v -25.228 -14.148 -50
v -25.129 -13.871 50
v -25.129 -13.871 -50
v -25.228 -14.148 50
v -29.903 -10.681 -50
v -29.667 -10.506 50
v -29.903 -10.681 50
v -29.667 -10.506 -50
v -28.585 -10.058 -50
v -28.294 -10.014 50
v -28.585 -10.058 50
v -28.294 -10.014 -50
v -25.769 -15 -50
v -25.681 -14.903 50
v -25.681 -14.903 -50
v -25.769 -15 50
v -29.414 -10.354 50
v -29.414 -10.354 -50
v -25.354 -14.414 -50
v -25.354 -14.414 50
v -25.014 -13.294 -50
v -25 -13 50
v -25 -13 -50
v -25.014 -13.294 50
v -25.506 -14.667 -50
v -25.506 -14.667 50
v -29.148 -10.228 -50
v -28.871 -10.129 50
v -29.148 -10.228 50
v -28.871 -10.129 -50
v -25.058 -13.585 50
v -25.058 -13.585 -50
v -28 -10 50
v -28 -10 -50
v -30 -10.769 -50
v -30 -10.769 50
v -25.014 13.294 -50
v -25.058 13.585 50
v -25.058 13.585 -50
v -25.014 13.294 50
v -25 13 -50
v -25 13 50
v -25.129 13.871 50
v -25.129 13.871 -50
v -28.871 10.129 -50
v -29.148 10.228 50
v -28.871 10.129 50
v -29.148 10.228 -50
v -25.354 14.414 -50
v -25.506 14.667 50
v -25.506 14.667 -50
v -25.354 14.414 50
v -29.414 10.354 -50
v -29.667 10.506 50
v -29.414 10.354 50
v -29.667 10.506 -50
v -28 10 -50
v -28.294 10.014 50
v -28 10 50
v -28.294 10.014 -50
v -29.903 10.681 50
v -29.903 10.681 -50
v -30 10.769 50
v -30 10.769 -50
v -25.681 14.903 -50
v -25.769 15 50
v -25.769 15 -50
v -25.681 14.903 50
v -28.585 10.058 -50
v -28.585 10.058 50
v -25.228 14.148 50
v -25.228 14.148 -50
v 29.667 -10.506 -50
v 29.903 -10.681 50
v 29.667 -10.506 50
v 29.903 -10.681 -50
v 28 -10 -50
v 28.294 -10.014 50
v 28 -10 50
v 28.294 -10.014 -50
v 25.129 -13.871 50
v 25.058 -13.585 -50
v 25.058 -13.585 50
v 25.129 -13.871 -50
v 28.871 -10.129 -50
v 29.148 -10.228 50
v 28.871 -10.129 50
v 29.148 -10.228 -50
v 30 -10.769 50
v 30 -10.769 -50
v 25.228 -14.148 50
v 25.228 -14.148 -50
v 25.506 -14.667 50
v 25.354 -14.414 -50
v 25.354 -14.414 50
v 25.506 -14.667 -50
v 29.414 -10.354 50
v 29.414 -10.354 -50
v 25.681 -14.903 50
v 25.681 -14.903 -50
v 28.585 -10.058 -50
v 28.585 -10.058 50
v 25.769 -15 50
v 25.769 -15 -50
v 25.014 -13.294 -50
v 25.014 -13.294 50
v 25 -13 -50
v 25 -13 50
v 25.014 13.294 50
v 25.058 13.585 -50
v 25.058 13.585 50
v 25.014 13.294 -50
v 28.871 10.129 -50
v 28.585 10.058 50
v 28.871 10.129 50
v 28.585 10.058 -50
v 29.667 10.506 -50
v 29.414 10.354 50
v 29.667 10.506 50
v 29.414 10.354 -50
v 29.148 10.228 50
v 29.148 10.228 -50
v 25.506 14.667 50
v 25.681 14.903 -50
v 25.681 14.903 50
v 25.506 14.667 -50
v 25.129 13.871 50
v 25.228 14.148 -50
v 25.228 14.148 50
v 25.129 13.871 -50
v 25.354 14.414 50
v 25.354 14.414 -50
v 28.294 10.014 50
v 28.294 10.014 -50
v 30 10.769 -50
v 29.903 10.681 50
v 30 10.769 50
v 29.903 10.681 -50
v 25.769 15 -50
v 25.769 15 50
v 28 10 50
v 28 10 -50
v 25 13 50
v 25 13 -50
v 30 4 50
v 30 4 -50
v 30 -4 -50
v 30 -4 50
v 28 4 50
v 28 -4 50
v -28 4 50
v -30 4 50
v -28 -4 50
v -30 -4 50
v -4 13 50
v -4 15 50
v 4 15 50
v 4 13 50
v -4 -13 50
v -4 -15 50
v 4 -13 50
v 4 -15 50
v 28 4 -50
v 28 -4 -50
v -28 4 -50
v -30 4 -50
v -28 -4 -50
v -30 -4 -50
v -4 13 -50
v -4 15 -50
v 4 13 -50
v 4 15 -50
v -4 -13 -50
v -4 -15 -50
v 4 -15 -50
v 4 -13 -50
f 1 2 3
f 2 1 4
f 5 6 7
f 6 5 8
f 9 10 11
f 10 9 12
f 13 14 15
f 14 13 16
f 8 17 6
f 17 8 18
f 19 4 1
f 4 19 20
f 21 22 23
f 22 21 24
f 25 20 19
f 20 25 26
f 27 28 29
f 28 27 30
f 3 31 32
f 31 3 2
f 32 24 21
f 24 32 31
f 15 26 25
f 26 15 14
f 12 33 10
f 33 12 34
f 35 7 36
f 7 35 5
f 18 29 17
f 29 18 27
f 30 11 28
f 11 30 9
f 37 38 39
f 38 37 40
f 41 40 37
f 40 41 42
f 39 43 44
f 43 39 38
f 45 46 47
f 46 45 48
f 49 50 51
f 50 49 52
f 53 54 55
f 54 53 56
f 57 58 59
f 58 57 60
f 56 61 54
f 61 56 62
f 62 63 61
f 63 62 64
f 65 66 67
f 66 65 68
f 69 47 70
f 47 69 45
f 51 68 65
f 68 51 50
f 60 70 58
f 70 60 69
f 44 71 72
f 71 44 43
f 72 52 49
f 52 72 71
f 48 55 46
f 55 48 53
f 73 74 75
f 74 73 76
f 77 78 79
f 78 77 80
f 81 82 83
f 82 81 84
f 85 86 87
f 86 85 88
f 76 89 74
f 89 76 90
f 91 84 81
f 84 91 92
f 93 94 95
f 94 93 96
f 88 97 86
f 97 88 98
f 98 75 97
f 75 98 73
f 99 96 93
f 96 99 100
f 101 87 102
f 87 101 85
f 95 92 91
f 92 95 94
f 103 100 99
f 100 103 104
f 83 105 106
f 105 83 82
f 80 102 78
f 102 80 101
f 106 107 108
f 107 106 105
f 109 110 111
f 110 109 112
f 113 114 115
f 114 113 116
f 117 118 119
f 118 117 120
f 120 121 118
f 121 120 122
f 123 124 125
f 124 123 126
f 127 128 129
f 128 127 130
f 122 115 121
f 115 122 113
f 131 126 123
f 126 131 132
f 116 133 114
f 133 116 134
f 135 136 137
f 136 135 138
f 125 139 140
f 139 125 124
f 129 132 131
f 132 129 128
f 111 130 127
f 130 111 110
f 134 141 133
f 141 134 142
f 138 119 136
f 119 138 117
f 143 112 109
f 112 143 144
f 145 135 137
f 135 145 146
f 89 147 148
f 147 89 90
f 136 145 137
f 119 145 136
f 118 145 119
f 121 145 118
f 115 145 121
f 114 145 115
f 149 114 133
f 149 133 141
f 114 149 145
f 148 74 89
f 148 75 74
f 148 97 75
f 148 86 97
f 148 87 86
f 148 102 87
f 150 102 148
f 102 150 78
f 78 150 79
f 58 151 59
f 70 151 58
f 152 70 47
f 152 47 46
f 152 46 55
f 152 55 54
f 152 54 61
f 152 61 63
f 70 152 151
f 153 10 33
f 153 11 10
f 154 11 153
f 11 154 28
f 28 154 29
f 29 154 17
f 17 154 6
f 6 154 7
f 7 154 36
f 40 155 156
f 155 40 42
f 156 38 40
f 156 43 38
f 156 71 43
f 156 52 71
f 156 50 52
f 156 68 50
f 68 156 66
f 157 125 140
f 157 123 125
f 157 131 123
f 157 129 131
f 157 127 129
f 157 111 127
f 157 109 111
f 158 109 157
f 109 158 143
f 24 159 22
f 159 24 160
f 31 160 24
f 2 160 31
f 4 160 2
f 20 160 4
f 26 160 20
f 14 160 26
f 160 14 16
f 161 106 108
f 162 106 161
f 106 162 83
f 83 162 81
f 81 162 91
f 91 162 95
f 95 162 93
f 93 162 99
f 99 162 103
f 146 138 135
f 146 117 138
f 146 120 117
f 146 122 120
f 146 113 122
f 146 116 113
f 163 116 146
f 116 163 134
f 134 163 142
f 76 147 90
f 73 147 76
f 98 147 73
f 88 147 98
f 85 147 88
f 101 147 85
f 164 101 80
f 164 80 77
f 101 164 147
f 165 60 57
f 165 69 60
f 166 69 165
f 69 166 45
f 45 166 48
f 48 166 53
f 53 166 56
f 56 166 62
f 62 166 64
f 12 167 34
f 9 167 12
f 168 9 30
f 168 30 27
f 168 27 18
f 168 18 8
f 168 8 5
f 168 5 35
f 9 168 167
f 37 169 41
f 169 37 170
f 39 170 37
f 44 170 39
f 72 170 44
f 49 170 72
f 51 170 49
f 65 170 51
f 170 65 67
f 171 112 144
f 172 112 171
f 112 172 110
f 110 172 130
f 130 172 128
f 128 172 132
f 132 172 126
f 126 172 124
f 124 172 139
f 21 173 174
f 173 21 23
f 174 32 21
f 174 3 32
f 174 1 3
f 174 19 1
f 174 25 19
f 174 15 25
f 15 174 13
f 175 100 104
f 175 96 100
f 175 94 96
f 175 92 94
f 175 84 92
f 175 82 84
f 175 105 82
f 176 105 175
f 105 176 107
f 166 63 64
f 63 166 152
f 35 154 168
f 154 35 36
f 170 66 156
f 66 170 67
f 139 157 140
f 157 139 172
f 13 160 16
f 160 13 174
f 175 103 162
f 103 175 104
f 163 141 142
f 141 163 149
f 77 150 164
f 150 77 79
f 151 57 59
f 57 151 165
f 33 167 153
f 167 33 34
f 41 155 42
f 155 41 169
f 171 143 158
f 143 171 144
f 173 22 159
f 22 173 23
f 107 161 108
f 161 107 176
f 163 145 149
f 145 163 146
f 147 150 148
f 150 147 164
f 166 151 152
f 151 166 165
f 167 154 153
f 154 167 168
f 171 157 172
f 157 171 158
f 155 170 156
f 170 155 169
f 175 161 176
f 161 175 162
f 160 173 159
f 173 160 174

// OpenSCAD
$fn=64;

module extrusion_3060(length=100, w=60, h=30, wall=2.0, slot=8.0, slot_depth=6.0, core_d=12.0, bore_d=5.2) {
    difference() {
        // Outer body
        cube([w, h, length], center=true);

        // Inner hollow (approximate)
        cube([w-2*wall, h-2*wall, length+0.2], center=true);

        // Central bore
        cylinder(d=bore_d, h=length+0.4, center=true);

        // Core relief (approximate)
        cylinder(d=core_d, h=length+0.4, center=true);

        // T-slots (approximate) on all four sides
        // +X face
        translate([w/2 - slot_depth/2, 0, 0])
            cube([slot_depth+0.2, slot, length+0.4], center=true);
        // -X face
        translate([-w/2 + slot_depth/2, 0, 0])
            cube([slot_depth+0.2, slot, length+0.4], center=true);
        // +Y face
        translate([0, h/2 - slot_depth/2, 0])
            cube([slot, slot_depth+0.2, length+0.4], center=true);
        // -Y face
        translate([0, -h/2 + slot_depth/2, 0])
            cube([slot, slot_depth+0.2, length+0.4], center=true);

        // Corner reliefs (approximate)
        for (sx=[-1,1], sy=[-1,1]) {
            translate([sx*(w/2-wall), sy*(h/2-wall), 0])
                cylinder(d=6.0, h=length+0.4, center=true);
        }
    }
}

extrusion_3060(length=100, w=60, h=30);
